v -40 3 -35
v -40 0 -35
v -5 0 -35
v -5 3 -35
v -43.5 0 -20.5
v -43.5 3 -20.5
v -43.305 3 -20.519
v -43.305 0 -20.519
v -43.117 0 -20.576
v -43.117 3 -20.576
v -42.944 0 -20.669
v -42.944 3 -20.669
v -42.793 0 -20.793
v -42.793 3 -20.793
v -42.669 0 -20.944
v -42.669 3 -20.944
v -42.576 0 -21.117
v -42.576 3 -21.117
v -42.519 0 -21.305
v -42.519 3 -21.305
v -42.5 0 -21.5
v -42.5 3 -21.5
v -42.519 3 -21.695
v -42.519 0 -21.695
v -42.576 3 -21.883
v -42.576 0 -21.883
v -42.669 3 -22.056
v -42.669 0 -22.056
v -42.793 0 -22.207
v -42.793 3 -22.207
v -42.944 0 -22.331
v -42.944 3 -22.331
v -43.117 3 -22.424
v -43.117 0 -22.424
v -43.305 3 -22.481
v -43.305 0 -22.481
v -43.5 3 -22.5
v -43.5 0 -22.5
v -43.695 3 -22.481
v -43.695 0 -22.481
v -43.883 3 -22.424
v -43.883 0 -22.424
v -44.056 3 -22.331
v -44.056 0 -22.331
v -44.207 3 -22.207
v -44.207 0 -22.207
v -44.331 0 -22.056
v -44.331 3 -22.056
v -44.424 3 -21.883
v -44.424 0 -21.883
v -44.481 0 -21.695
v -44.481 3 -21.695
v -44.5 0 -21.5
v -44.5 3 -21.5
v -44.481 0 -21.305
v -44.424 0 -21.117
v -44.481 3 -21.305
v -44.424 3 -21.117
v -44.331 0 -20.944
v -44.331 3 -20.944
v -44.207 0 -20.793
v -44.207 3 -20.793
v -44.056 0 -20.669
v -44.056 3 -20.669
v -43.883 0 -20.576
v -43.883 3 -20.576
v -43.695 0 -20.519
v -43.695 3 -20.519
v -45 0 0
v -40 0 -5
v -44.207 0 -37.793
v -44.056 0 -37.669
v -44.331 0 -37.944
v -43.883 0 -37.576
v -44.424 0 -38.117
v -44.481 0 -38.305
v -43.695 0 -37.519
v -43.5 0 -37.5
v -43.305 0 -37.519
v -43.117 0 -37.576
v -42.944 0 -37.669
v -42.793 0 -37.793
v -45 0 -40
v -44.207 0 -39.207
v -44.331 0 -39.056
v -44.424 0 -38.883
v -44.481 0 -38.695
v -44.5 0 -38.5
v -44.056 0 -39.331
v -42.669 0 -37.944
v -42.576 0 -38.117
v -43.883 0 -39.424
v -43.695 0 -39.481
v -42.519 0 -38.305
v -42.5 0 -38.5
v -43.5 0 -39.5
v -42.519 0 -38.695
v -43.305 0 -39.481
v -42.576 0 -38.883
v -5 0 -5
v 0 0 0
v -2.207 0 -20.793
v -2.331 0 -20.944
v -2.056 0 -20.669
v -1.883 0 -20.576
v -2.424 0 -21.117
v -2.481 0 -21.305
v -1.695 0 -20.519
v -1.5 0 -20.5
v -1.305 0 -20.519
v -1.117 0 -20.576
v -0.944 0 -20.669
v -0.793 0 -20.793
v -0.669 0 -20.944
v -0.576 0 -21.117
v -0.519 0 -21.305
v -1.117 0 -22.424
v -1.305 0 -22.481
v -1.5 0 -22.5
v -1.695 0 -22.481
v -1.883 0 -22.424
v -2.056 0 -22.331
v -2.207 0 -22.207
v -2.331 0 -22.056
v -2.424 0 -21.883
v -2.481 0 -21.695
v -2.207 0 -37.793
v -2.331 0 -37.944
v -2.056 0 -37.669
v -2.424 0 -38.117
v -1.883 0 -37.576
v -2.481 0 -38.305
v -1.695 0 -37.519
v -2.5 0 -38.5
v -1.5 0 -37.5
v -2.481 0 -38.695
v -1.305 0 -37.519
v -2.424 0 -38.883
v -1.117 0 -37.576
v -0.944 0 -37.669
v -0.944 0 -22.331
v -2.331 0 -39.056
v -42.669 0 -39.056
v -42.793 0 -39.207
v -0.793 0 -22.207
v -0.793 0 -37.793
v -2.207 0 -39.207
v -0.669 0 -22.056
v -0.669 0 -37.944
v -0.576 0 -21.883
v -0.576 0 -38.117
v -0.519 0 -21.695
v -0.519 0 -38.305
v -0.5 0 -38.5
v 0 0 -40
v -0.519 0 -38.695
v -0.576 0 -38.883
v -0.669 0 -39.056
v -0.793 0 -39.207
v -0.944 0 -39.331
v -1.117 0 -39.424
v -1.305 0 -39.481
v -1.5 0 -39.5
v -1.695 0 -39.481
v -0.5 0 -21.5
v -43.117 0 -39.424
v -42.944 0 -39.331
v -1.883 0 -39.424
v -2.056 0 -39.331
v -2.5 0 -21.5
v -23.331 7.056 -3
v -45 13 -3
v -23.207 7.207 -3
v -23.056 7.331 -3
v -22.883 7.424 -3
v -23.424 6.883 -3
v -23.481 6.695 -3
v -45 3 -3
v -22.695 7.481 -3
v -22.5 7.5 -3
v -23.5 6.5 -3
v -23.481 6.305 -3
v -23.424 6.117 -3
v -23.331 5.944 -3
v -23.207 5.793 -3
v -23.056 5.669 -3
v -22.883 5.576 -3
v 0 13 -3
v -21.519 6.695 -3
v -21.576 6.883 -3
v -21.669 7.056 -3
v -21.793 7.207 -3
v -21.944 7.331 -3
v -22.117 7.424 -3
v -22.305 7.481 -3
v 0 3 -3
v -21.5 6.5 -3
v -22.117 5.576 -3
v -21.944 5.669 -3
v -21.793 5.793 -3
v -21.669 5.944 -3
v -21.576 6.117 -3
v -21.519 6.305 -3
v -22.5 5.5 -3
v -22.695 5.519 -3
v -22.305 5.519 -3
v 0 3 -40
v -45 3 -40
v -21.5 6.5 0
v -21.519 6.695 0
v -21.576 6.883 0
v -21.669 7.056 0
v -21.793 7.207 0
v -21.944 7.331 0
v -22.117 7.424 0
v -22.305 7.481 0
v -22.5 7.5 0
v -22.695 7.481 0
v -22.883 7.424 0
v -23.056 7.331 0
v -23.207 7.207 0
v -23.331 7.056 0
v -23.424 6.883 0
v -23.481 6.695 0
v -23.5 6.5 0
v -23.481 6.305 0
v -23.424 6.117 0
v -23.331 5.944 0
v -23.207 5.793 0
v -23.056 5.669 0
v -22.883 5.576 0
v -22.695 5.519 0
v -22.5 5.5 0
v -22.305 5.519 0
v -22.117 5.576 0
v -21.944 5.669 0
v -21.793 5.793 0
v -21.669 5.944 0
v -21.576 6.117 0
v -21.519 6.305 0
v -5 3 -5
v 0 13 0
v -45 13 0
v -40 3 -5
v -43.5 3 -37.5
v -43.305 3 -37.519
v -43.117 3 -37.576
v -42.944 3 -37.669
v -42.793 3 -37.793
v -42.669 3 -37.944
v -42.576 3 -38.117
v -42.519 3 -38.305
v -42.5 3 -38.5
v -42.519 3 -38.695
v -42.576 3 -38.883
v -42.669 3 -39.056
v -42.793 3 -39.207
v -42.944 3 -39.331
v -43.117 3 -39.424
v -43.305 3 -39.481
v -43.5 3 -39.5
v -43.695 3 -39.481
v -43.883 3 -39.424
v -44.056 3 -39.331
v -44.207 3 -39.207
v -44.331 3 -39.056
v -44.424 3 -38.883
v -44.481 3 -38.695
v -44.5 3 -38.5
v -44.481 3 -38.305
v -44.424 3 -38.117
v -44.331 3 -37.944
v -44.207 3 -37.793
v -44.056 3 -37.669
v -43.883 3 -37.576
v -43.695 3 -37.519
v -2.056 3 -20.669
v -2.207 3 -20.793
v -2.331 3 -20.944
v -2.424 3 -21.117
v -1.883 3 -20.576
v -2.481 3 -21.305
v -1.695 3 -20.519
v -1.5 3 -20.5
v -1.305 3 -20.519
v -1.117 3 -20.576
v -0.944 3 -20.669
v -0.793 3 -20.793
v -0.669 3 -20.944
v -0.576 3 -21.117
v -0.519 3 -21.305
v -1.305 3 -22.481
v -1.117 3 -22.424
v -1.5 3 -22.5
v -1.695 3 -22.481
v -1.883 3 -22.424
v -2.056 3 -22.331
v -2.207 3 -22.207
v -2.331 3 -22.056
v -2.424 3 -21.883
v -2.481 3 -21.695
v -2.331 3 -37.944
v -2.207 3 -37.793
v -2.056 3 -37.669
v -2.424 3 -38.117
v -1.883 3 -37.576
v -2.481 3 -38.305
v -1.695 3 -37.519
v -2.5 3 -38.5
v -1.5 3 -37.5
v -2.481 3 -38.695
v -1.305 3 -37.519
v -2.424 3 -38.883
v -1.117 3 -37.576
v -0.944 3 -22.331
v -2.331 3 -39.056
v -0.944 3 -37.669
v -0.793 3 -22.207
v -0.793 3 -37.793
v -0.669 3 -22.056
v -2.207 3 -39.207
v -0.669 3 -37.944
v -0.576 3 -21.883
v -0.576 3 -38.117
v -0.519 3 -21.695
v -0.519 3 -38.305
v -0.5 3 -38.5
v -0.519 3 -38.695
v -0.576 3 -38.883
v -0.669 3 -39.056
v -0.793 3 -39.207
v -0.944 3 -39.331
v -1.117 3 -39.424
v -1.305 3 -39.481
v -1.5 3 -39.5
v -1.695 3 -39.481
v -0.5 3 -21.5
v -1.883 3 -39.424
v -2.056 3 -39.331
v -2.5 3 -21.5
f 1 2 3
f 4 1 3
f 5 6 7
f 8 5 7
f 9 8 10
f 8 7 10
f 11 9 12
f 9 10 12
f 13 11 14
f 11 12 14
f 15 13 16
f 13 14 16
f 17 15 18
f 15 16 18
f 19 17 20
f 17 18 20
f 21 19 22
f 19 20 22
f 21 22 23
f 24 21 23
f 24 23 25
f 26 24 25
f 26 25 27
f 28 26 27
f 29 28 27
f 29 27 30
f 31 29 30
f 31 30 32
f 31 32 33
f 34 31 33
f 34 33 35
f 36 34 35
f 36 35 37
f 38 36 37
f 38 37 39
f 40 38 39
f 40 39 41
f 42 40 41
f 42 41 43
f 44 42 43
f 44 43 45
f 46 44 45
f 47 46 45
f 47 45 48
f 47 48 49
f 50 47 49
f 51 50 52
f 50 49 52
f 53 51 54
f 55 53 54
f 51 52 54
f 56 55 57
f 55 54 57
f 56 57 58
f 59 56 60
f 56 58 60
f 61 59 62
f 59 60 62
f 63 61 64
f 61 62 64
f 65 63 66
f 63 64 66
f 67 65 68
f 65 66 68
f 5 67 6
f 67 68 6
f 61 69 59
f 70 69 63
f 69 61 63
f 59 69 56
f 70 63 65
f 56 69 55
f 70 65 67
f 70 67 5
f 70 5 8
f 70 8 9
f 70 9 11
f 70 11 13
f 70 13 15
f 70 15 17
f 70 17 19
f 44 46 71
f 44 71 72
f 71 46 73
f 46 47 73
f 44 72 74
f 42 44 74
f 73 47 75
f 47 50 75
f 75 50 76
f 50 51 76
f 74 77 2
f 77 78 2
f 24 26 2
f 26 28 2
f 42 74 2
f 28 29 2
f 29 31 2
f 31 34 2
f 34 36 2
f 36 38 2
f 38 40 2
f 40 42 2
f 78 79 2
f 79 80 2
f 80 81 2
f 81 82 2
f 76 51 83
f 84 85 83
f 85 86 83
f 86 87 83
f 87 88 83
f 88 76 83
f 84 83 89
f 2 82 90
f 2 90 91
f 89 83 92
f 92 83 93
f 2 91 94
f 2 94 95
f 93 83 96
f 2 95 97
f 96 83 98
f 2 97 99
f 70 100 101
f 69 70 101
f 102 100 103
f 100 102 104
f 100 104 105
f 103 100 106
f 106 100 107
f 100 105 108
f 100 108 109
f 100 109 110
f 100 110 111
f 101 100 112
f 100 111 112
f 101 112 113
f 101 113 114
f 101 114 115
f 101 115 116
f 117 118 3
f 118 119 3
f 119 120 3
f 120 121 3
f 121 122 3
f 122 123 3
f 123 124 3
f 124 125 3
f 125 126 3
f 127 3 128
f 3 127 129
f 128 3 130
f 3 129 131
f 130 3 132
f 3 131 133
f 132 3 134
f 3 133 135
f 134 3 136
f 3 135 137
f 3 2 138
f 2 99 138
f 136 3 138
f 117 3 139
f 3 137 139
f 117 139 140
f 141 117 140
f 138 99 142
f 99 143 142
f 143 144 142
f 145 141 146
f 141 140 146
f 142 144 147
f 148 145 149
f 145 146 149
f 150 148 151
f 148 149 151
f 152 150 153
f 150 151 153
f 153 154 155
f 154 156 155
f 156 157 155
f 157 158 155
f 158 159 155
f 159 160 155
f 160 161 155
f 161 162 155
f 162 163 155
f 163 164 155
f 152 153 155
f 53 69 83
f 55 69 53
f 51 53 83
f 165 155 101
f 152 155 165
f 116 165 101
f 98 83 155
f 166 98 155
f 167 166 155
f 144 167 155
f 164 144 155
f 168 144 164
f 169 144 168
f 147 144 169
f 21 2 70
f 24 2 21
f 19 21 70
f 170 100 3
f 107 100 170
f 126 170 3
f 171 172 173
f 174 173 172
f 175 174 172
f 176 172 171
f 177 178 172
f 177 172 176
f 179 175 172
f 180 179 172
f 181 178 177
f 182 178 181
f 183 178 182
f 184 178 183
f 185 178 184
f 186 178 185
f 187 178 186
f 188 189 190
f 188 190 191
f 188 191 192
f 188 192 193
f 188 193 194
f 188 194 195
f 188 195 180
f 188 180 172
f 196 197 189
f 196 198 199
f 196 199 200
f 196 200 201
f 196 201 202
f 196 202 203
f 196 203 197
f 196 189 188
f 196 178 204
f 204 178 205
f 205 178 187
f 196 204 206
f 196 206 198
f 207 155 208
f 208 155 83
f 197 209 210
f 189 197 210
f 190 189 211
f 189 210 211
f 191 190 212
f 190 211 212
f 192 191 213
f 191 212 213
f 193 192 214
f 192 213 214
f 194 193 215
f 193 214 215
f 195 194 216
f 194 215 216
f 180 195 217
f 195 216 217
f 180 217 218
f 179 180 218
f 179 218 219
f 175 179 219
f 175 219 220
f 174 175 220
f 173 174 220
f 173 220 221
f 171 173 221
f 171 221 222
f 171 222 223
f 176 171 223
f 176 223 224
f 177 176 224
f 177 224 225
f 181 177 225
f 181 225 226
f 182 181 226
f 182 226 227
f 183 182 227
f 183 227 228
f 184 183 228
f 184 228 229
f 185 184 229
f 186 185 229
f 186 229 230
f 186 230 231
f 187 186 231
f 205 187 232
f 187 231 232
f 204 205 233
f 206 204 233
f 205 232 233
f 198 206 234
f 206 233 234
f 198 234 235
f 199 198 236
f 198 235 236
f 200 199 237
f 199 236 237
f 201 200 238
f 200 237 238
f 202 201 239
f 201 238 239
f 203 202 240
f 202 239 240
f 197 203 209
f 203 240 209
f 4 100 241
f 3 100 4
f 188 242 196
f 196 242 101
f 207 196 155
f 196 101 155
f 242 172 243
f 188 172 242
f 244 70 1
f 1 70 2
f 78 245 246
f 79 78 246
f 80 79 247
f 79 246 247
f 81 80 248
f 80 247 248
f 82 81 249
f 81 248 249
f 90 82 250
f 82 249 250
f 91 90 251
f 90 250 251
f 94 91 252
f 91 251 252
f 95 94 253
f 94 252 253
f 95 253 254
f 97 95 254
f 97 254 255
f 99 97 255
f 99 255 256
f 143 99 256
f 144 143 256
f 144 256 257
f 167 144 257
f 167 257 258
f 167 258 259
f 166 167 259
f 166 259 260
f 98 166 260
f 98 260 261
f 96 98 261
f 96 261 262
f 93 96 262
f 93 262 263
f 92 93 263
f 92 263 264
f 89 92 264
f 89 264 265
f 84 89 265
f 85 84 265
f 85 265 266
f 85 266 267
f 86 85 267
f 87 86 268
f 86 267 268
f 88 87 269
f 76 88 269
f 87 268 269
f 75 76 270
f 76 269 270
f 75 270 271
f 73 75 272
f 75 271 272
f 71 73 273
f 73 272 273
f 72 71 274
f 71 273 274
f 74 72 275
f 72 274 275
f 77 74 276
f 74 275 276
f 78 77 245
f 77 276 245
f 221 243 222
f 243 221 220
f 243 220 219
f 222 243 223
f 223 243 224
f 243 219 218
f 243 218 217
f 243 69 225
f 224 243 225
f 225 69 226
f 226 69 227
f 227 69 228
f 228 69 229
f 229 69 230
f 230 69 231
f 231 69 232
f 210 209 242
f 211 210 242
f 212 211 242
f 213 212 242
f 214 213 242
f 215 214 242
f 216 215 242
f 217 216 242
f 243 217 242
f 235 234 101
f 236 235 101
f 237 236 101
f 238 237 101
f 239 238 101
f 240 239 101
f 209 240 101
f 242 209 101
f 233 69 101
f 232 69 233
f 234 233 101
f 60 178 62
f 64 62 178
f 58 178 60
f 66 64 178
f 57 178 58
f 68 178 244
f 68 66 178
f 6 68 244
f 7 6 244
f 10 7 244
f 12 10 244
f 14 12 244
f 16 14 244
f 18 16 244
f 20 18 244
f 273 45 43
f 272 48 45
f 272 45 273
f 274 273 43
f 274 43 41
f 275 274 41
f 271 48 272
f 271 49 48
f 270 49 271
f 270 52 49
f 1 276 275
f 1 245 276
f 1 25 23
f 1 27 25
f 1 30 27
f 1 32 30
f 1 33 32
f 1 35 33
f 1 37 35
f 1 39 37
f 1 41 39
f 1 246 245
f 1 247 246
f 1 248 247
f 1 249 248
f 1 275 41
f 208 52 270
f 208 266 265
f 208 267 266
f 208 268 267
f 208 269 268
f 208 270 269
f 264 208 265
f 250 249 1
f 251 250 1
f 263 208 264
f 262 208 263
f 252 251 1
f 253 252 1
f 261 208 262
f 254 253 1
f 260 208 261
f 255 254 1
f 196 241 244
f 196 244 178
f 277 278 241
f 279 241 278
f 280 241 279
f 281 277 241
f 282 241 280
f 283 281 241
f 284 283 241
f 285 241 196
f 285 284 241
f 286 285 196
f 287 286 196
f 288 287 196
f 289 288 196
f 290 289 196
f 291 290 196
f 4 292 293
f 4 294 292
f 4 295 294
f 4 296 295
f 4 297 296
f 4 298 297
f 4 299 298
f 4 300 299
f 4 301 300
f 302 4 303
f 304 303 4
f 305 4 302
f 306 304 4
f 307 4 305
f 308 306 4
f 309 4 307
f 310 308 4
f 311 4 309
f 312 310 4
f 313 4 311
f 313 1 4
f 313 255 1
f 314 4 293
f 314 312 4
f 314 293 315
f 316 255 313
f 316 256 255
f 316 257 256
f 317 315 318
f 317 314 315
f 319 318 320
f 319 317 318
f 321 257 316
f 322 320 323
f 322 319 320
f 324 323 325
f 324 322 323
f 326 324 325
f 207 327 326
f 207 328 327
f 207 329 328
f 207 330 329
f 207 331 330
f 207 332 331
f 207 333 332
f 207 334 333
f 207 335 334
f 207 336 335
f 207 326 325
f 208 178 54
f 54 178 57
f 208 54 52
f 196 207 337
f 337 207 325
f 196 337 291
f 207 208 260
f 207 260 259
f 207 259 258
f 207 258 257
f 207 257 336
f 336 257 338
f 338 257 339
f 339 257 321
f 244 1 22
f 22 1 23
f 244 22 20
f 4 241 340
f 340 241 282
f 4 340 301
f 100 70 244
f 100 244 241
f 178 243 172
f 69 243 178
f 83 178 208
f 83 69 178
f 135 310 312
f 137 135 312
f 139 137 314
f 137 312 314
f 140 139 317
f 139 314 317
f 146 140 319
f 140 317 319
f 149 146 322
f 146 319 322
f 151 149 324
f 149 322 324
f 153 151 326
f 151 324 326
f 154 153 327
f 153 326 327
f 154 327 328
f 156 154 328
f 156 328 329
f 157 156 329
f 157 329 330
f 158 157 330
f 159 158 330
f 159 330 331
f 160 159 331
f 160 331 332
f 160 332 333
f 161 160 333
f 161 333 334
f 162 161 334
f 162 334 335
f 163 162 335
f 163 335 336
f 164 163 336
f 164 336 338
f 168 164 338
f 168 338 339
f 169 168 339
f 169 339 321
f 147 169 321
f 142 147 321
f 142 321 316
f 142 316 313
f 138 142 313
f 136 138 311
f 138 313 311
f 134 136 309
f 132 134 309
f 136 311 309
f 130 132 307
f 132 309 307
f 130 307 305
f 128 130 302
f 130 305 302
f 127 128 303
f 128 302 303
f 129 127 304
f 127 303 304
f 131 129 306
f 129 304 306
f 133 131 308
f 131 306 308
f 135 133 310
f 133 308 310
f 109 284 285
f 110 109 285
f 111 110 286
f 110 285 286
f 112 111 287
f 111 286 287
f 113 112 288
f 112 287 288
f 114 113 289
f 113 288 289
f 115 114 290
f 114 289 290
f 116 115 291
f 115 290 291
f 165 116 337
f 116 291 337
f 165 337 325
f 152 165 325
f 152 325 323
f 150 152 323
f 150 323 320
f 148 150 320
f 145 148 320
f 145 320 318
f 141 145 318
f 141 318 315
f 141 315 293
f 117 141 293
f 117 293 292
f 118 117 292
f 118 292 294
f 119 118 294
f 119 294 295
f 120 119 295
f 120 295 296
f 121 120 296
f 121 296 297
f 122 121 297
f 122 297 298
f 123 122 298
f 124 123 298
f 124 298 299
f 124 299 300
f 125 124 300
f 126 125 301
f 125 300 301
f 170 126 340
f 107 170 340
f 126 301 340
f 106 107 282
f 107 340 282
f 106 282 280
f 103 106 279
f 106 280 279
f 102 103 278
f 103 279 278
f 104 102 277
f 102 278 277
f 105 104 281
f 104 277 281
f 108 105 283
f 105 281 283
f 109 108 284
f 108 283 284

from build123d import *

# Parameters (mm, degrees)
SKETCH2_W                 = 5
SKETCH2_H                 = 40
SKETCH2_W_2               = 35
SKETCH2_H_2               = 5
BOSS_EXTRUDE1_DEPTH       = 3
F_2_0MM_DOWEL_HOLE1_D     = 2
F_2_0MM_DOWEL_HOLE1_DEPTH = 12.029
F_2_0MM_DOWEL_HOLE1_TIP   = 0.600860619
SKETCH4_W                 = 45
SKETCH4_H                 = 3
BOSS_EXTRUDE2_DEPTH       = 10
F_2_0MM_DOWEL_HOLE2_D     = 2
F_2_0MM_DOWEL_HOLE2_DEPTH = 12
F_2_0MM_DOWEL_HOLE2_TIP   = 0.600860619


with BuildPart() as part:
    # Sketch2 → Boss-Extrude1 (new body)
    with BuildSketch(Plane(origin=(0, 0, 0), x_dir=(1, 0, 0), z_dir=(0, 1, 0))):
        with Locations((-42.5, 20)):
            Rectangle(SKETCH2_W, SKETCH2_H)
        with Locations((-22.5, 37.5)):
            Rectangle(SKETCH2_W_2, SKETCH2_H_2)
        with Locations((-2.5, 20)):
            Rectangle(SKETCH2_W, SKETCH2_H)
        with Locations((-22.5, 2.5)):
            Rectangle(SKETCH2_W_2, SKETCH2_H_2)
    extrude(amount=BOSS_EXTRUDE1_DEPTH)

    # Ø2.0mm Dowel Hole1
    with Locations(Plane(origin=(-1.5, 0, -38.5), x_dir=(0, 0, -1), z_dir=(0, -1, 0))):
        with Locations((0, 0), (0, -42), (-17, 0), (-17, -42)):
            Hole(F_2_0MM_DOWEL_HOLE1_D / 2, depth=F_2_0MM_DOWEL_HOLE1_DEPTH)
            with Locations((0, 0, -(F_2_0MM_DOWEL_HOLE1_DEPTH + F_2_0MM_DOWEL_HOLE1_TIP / 2))):  # 118° drill point
                Cone(0, F_2_0MM_DOWEL_HOLE1_D / 2, F_2_0MM_DOWEL_HOLE1_TIP, mode=Mode.SUBTRACT)

    # Sketch4 → Boss-Extrude2 (add)
    with BuildSketch(Plane(origin=(0, 3, 0), x_dir=(1, 0, 0), z_dir=(0, 1, 0))):
        with Locations((-22.5, 1.5)):
            Rectangle(SKETCH4_W, SKETCH4_H)
    extrude(amount=BOSS_EXTRUDE2_DEPTH)

    # Ø2.0mm Dowel Hole2
    with Locations(Plane(origin=(0, 0, -3), x_dir=(-1, 0, 0), z_dir=(0, 0, -1))):
        with Locations((22.5, 6.5)):
            Hole(F_2_0MM_DOWEL_HOLE2_D / 2, depth=F_2_0MM_DOWEL_HOLE2_DEPTH)
            with Locations((0, 0, -(F_2_0MM_DOWEL_HOLE2_DEPTH + F_2_0MM_DOWEL_HOLE2_TIP / 2))):  # 118° drill point
                Cone(0, F_2_0MM_DOWEL_HOLE2_D / 2, F_2_0MM_DOWEL_HOLE2_TIP, mode=Mode.SUBTRACT)


solid = part.part
